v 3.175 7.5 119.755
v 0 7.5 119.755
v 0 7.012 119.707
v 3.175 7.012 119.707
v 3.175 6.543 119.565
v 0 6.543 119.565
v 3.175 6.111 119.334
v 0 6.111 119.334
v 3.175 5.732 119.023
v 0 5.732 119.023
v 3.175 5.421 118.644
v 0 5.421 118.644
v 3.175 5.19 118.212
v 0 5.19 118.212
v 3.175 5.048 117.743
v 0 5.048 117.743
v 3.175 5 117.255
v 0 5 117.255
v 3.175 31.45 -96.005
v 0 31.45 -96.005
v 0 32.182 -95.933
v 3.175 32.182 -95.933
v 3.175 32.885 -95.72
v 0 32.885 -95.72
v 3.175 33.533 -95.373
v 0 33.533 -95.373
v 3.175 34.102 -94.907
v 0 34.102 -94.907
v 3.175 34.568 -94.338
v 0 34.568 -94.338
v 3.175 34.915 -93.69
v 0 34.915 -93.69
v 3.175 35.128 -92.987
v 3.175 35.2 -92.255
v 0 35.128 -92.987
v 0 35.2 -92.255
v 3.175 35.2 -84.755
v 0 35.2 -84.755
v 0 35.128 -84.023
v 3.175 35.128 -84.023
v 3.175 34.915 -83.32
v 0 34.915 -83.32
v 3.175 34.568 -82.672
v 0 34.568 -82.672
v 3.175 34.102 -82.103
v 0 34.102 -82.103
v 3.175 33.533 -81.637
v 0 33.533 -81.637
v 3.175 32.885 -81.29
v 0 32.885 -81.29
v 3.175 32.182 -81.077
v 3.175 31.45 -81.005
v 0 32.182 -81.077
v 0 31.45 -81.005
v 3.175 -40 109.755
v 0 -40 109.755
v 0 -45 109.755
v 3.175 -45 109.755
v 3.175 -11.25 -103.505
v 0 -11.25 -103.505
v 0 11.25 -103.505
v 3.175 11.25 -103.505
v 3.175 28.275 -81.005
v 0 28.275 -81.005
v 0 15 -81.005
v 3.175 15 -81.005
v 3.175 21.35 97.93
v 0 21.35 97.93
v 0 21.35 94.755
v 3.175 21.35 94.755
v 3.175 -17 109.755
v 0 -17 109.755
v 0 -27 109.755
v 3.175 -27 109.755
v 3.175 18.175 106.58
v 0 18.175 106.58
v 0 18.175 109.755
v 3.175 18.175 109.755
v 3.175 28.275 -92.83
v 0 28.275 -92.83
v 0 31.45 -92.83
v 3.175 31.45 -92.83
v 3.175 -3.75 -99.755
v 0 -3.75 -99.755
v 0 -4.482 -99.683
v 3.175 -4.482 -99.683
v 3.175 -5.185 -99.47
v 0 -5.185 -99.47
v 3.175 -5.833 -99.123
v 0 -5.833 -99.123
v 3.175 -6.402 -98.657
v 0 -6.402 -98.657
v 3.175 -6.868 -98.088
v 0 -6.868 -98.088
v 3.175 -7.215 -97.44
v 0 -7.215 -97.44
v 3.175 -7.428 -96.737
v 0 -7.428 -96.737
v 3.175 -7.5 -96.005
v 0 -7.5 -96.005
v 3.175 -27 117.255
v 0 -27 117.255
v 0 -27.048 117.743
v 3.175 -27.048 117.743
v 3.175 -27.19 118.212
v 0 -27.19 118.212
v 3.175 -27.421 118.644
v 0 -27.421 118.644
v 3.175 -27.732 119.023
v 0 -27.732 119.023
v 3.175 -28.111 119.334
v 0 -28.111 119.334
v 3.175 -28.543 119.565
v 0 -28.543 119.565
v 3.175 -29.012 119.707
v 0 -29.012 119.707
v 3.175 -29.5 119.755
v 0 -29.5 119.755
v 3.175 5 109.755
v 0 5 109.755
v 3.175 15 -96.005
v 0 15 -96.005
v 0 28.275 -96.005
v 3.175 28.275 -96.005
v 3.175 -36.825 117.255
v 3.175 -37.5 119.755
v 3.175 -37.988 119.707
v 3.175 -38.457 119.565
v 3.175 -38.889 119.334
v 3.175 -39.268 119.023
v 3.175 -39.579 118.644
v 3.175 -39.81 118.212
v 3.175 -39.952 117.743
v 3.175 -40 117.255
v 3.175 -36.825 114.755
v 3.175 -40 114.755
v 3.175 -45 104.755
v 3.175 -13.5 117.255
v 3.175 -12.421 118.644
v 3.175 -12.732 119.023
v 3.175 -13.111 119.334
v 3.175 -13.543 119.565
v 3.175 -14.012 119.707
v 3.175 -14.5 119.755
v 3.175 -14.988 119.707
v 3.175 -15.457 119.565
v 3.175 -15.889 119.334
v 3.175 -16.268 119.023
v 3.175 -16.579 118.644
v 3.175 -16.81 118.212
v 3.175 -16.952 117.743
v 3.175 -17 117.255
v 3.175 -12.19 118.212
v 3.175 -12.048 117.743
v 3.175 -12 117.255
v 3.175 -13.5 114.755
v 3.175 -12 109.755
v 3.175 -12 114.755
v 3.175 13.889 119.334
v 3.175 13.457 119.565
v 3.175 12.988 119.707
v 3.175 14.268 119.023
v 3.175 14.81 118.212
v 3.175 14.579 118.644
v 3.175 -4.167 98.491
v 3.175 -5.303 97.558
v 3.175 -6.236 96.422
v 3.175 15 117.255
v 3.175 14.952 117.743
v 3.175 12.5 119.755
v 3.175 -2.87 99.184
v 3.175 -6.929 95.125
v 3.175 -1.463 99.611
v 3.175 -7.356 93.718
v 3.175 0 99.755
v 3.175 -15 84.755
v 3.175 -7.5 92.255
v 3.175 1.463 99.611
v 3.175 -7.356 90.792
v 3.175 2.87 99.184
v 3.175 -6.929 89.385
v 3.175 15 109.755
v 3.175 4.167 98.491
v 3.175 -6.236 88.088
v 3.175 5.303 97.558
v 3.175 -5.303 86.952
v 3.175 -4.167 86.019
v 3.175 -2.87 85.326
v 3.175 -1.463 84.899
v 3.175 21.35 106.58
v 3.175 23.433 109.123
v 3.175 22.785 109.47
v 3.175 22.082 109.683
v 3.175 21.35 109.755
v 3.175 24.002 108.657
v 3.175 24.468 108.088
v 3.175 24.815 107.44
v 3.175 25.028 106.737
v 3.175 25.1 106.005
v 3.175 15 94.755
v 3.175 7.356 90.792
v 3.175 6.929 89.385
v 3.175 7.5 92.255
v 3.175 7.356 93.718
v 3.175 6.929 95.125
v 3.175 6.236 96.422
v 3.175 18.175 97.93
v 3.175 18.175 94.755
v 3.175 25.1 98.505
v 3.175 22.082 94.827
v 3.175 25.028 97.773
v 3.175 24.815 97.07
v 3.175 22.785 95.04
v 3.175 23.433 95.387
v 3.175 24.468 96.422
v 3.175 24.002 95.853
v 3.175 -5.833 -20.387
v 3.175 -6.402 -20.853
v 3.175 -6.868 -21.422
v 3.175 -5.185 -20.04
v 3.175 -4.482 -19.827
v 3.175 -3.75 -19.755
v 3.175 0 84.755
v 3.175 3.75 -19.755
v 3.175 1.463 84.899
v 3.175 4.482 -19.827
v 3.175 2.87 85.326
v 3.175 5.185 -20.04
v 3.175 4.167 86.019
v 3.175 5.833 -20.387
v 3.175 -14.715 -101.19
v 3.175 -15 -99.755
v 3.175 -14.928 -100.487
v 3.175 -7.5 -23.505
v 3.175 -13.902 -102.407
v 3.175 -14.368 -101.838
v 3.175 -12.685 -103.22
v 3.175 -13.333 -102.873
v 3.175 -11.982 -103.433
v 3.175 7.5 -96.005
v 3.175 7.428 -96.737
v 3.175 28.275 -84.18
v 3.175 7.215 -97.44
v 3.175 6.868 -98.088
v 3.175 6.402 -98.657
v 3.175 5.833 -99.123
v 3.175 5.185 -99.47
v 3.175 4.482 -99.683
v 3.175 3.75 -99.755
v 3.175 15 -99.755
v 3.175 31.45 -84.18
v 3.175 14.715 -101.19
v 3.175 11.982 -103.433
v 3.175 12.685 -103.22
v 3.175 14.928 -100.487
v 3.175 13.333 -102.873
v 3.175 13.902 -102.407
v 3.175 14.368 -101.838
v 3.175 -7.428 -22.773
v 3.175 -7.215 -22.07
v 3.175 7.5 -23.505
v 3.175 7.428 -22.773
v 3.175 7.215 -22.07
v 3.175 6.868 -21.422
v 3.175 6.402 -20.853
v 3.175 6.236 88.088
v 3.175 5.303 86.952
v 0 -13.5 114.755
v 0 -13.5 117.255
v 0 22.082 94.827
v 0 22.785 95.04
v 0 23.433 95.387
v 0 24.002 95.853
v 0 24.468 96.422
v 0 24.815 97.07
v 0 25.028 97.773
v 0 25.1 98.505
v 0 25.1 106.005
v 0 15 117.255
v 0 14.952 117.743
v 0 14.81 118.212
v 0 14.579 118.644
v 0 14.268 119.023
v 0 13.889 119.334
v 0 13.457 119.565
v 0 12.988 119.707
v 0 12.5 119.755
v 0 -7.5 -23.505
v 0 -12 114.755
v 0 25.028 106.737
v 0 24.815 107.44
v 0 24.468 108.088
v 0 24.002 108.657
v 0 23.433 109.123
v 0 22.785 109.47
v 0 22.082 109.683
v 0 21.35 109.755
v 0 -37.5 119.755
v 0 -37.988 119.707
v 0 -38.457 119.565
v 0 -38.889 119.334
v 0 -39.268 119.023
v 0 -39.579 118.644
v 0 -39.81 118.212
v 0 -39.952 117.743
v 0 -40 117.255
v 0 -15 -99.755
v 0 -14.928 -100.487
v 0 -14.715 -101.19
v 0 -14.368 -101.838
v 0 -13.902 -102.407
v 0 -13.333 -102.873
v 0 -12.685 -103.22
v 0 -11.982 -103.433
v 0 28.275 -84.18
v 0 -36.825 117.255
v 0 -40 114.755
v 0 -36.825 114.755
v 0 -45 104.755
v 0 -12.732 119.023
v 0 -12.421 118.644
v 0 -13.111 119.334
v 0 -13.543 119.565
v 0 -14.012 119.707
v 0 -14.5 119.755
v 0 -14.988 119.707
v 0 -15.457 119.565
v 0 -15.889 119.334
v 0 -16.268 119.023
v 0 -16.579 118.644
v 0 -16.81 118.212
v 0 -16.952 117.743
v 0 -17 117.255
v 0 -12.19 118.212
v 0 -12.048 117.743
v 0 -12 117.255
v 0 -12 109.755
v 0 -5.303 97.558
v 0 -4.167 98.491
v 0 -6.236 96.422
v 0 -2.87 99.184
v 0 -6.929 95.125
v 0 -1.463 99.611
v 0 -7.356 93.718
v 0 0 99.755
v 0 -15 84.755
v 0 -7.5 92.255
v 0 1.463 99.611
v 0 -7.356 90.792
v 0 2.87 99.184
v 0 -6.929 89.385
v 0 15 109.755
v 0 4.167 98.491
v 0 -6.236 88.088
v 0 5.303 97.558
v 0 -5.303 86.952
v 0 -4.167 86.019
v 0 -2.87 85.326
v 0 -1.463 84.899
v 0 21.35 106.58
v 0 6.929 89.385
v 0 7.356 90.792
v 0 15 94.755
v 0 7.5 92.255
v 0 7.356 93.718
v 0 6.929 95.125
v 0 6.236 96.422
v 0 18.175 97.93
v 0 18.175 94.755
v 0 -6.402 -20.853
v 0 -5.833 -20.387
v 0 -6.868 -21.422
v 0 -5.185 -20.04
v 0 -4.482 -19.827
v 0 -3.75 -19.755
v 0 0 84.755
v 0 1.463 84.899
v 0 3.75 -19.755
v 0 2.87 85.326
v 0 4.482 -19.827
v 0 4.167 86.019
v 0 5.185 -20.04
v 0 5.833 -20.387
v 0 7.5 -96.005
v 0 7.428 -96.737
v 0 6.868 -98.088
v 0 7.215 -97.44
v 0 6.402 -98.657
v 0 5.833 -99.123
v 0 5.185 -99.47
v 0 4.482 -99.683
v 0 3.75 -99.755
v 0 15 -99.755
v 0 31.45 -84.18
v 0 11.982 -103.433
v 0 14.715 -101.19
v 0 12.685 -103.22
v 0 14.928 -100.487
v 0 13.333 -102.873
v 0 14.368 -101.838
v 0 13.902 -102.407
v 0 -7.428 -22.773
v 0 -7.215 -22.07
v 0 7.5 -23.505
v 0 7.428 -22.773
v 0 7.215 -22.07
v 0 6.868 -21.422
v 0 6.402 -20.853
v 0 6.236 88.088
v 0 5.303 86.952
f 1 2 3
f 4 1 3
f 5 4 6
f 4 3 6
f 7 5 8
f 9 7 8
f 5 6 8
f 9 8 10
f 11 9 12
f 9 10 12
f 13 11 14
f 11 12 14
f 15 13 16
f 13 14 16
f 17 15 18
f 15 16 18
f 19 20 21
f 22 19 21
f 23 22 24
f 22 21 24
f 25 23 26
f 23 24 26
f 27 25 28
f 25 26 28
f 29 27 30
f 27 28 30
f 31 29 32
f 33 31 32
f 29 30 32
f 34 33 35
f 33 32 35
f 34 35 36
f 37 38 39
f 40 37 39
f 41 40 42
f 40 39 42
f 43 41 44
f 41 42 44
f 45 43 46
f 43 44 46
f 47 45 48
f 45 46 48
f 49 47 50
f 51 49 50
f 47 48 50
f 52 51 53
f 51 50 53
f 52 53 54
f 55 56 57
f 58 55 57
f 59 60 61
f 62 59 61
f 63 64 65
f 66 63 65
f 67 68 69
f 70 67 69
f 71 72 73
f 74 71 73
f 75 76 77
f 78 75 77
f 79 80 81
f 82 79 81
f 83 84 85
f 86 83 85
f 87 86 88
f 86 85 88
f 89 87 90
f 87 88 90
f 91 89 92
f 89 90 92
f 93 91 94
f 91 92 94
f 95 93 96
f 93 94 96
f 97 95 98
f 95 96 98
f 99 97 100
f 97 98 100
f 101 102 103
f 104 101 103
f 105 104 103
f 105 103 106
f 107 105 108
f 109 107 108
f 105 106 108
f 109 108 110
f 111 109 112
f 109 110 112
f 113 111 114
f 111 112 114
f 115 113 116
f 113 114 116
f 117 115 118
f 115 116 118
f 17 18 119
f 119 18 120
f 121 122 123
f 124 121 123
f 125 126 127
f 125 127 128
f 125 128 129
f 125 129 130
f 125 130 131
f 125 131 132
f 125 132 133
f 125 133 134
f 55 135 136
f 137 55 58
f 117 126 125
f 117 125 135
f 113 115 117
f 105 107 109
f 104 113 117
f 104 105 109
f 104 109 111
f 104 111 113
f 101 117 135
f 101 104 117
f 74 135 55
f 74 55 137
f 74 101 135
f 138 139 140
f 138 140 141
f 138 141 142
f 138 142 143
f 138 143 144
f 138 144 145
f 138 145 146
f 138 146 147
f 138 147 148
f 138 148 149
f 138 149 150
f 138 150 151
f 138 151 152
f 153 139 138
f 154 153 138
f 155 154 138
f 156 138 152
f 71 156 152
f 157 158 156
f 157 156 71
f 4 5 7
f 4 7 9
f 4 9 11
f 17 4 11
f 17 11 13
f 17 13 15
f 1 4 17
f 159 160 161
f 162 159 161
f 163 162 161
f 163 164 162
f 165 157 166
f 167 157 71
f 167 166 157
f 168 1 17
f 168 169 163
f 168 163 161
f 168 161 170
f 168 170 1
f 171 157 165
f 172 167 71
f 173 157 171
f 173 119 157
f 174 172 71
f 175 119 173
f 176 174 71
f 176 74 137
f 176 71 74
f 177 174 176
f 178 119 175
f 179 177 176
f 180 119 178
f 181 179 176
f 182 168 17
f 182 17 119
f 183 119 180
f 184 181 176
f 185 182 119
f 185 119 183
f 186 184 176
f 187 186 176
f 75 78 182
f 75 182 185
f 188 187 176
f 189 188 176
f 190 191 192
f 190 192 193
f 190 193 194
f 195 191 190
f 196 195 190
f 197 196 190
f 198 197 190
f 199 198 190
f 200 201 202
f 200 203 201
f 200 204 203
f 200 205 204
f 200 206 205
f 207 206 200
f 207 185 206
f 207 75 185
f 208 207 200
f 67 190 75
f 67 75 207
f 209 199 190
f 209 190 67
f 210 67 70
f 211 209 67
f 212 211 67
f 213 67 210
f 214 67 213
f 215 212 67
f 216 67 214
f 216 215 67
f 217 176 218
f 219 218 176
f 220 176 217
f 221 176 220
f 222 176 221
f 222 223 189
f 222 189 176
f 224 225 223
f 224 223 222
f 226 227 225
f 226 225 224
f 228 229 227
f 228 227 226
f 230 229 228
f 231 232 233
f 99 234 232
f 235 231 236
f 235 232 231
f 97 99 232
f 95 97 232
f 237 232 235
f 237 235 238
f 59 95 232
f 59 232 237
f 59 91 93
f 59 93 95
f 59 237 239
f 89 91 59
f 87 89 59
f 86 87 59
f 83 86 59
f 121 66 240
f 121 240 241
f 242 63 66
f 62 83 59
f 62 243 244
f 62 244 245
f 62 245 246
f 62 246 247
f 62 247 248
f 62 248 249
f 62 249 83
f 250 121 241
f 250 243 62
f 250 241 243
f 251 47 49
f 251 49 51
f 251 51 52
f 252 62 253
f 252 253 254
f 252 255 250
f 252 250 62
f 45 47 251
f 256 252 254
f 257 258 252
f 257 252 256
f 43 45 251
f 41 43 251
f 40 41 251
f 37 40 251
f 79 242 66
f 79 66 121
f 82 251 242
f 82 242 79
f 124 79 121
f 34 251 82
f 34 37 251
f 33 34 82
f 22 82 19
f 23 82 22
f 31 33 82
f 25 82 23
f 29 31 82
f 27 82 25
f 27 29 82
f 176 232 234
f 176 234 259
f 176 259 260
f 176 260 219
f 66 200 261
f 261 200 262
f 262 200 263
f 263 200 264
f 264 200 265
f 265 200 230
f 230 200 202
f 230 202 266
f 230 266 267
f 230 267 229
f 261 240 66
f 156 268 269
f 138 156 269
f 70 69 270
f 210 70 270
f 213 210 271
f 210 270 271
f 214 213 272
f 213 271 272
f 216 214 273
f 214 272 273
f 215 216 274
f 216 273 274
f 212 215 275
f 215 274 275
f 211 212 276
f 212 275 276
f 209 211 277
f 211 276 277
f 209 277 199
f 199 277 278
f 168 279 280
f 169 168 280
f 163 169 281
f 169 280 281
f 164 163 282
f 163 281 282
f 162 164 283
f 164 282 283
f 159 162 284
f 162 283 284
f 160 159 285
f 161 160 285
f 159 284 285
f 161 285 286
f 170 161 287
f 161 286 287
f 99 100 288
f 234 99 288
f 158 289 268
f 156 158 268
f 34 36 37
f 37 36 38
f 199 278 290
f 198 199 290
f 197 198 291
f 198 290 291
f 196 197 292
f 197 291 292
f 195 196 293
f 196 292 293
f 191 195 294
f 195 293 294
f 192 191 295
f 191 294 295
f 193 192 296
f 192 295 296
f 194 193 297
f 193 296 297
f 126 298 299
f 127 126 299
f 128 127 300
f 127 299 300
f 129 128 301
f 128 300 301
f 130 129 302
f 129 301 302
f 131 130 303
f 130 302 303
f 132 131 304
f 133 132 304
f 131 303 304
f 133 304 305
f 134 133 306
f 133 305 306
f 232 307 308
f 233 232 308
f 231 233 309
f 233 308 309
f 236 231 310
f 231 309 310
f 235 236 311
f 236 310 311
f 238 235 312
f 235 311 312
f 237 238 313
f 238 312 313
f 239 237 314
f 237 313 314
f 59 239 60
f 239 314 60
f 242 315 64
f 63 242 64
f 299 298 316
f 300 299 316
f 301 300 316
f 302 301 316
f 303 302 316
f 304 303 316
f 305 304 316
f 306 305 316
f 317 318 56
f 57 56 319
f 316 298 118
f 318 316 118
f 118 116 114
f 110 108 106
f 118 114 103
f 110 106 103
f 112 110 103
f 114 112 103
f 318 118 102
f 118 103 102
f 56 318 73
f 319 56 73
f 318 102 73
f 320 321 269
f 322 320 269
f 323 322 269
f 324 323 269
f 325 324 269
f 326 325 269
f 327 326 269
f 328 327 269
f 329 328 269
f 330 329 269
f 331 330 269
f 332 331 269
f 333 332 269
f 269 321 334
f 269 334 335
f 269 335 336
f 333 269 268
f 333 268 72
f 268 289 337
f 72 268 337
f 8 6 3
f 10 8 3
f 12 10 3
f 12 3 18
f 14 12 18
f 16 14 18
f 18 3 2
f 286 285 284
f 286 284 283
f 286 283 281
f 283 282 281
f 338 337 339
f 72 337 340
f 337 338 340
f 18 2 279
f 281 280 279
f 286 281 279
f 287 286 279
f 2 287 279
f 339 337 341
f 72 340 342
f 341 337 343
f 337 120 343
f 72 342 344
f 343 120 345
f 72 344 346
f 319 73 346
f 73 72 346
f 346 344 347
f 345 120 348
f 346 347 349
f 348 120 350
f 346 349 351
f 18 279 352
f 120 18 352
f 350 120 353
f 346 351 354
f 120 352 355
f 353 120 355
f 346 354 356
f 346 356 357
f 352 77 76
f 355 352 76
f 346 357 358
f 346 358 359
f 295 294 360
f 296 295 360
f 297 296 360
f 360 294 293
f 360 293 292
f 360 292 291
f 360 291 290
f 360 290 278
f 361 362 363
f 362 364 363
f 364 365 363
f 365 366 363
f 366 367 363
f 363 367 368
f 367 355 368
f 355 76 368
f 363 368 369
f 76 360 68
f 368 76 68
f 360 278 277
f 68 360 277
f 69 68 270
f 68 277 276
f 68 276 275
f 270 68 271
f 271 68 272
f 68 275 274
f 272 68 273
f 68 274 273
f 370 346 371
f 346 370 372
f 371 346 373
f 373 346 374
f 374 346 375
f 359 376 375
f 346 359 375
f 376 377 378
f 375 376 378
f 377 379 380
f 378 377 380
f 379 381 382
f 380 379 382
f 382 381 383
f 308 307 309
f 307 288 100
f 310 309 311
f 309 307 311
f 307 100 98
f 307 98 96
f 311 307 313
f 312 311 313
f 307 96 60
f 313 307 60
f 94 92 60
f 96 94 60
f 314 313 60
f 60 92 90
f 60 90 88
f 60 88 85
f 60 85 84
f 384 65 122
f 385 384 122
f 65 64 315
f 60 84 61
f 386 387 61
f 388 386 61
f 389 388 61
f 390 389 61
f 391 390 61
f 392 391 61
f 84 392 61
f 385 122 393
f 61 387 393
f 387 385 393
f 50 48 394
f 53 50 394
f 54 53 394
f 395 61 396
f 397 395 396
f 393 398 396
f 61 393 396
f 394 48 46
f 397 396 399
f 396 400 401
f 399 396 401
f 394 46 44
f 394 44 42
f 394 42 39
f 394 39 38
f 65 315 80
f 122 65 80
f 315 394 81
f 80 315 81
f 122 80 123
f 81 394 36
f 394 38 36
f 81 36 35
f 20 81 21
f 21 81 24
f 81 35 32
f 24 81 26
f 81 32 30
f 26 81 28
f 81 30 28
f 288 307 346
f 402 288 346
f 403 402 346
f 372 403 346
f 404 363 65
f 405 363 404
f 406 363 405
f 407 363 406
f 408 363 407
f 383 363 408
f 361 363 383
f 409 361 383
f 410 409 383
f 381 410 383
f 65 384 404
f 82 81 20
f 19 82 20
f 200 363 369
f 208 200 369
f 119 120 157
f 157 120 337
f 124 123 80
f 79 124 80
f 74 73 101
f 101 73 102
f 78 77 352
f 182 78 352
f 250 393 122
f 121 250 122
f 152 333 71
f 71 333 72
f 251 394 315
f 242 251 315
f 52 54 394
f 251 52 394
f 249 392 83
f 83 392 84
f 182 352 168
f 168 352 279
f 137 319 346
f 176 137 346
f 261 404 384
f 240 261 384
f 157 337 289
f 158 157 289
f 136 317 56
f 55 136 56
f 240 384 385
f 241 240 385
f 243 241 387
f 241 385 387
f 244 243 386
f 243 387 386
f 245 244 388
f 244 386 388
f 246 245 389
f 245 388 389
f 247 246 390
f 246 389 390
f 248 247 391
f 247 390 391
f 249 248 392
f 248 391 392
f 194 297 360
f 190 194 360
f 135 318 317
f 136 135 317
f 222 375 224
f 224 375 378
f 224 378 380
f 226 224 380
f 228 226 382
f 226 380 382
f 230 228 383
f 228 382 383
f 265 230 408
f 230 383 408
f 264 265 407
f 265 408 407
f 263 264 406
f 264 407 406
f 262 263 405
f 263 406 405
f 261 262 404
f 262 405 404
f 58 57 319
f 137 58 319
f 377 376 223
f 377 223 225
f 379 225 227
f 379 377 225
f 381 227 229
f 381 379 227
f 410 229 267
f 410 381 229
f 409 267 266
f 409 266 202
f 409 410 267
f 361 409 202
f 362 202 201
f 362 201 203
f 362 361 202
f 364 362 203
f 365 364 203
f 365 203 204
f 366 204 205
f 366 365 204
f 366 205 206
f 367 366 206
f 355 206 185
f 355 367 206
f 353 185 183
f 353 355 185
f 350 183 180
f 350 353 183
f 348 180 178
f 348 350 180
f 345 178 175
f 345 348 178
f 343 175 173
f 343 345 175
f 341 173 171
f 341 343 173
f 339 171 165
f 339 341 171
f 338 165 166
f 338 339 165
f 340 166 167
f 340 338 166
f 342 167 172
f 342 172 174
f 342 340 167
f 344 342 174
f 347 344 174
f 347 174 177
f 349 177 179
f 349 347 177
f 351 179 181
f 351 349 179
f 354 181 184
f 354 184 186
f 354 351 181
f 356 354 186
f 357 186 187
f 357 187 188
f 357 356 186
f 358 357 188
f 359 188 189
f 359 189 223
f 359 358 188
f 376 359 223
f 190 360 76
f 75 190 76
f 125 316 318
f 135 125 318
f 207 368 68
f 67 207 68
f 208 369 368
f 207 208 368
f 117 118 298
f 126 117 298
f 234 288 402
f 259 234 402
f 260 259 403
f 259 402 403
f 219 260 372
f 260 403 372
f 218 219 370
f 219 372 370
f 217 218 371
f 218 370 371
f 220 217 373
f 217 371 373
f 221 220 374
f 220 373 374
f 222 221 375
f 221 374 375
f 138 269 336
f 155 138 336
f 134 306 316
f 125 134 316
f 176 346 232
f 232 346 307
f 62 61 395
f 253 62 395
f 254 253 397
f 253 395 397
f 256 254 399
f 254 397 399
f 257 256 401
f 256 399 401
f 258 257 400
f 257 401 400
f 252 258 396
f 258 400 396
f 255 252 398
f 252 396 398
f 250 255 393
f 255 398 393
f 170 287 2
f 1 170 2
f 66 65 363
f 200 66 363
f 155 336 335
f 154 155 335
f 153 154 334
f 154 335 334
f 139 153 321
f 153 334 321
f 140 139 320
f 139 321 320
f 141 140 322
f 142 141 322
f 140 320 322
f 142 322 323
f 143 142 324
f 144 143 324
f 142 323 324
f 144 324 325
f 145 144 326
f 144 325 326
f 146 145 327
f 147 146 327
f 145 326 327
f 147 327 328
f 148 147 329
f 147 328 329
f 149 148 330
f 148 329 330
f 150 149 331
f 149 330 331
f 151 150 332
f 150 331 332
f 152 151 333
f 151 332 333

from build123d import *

# Parameters (mm, degrees)
SKETCH1_R           = 7.5
BOSS_EXTRUDE1_DEPTH = 3.175


with BuildPart() as part:
    # Sketch1 → Boss-Extrude1 (new body)
    with BuildSketch(Plane(origin=(0, 0, 0), x_dir=(0, 0, -1), z_dir=(1, 0, 0))):
        with BuildLine():
            Line((-94.755, 15), (-94.755, 18.175))
            Line((-94.755, 18.175), (-97.93, 18.175))
            Line((-97.93, 18.175), (-97.93, 21.35))
            Line((-97.93, 21.35), (-94.755, 21.35))
            ThreePointArc((-94.755, 21.35), (-95.853349571, 24.001650429), (-98.505, 25.1))
            Line((-98.505, 25.1), (-106.005, 25.1))
            ThreePointArc((-106.005, 25.1), (-108.656650429, 24.001650429), (-109.755, 21.35))
            Line((-109.755, 21.35), (-106.58, 21.35))
            Line((-106.58, 21.35), (-106.58, 18.175))
            Line((-106.58, 18.175), (-109.755, 18.175))
            Line((-109.755, 18.175), (-109.755, 15))
            Line((-109.755, 15), (-117.255, 15))
            ThreePointArc((-117.255, 15), (-119.022766953, 14.267766953), (-119.755, 12.5))
            Line((-119.755, 12.5), (-119.755, 7.5))
            ThreePointArc((-119.755, 7.5), (-119.022766953, 5.732233047), (-117.255, 5))
            Line((-117.255, 5), (-109.755, 5))
            Line((-109.755, 5), (-109.755, -12))
            Line((-109.755, -12), (-114.755, -12))
            Line((-114.755, -12), (-114.755, -13.5))
            Line((-114.755, -13.5), (-117.255, -13.5))
            Line((-117.255, -13.5), (-117.255, -12))
            ThreePointArc((-117.255, -12), (-119.755, -14.5), (-117.255, -17))
            Line((-117.255, -17), (-109.755, -17))
            Line((-109.755, -17), (-109.755, -27))
            Line((-109.755, -27), (-117.255, -27))
            ThreePointArc((-117.255, -27), (-119.022766953, -27.732233047), (-119.755, -29.5))
            Line((-119.755, -29.5), (-119.755, -37.5))
            ThreePointArc((-119.755, -37.5), (-119.022766953, -39.267766953), (-117.255, -40))
            Line((-117.255, -40), (-117.255, -36.825))
            Line((-117.255, -36.825), (-114.755, -36.825))
            Line((-114.755, -36.825), (-114.755, -40))
            Line((-114.755, -40), (-109.755, -40))
            Line((-109.755, -40), (-109.755, -45))
            Line((-109.755, -45), (-104.755, -45))
            Line((-104.755, -45), (-84.755, -15))
            Line((-84.755, -15), (99.755, -15))
            ThreePointArc((99.755, -15), (102.406650429, -13.901650429), (103.505, -11.25))
            Line((103.505, -11.25), (103.505, 11.25))
            ThreePointArc((103.505, 11.25), (102.406650429, 13.901650429), (99.755, 15))
            Line((99.755, 15), (96.005, 15))
            Line((96.005, 15), (96.005, 28.275))
            Line((96.005, 28.275), (92.83, 28.275))
            Line((92.83, 28.275), (92.83, 31.45))
            Line((92.83, 31.45), (96.005, 31.45))
            ThreePointArc((96.005, 31.45), (94.906650429, 34.101650429), (92.255, 35.2))
            Line((92.255, 35.2), (84.755, 35.2))
            ThreePointArc((84.755, 35.2), (82.103349571, 34.101650429), (81.005, 31.45))
            Line((81.005, 31.45), (84.18, 31.45))
            Line((84.18, 31.45), (84.18, 28.275))
            Line((84.18, 28.275), (81.005, 28.275))
            Line((81.005, 28.275), (81.005, 15))
            Line((81.005, 15), (-94.755, 15))
        make_face()
        with Locations((-92.255, 0)):
            Circle(SKETCH1_R, mode=Mode.SUBTRACT)
        with BuildLine():
            Line((23.505, 7.5), (96.005, 7.5))
            ThreePointArc((96.005, 7.5), (98.656650429, 6.401650429), (99.755, 3.75))
            Line((99.755, 3.75), (99.755, -3.75))
            ThreePointArc((99.755, -3.75), (98.656650429, -6.401650429), (96.005, -7.5))
            Line((96.005, -7.5), (23.505, -7.5))
            ThreePointArc((23.505, -7.5), (20.853349571, -6.401650429), (19.755, -3.75))
            Line((19.755, -3.75), (19.755, 3.75))
            ThreePointArc((19.755, 3.75), (20.853349571, 6.401650429), (23.505, 7.5))
        make_face(mode=Mode.SUBTRACT)
    extrude(amount=BOSS_EXTRUDE1_DEPTH)


solid = part.part
